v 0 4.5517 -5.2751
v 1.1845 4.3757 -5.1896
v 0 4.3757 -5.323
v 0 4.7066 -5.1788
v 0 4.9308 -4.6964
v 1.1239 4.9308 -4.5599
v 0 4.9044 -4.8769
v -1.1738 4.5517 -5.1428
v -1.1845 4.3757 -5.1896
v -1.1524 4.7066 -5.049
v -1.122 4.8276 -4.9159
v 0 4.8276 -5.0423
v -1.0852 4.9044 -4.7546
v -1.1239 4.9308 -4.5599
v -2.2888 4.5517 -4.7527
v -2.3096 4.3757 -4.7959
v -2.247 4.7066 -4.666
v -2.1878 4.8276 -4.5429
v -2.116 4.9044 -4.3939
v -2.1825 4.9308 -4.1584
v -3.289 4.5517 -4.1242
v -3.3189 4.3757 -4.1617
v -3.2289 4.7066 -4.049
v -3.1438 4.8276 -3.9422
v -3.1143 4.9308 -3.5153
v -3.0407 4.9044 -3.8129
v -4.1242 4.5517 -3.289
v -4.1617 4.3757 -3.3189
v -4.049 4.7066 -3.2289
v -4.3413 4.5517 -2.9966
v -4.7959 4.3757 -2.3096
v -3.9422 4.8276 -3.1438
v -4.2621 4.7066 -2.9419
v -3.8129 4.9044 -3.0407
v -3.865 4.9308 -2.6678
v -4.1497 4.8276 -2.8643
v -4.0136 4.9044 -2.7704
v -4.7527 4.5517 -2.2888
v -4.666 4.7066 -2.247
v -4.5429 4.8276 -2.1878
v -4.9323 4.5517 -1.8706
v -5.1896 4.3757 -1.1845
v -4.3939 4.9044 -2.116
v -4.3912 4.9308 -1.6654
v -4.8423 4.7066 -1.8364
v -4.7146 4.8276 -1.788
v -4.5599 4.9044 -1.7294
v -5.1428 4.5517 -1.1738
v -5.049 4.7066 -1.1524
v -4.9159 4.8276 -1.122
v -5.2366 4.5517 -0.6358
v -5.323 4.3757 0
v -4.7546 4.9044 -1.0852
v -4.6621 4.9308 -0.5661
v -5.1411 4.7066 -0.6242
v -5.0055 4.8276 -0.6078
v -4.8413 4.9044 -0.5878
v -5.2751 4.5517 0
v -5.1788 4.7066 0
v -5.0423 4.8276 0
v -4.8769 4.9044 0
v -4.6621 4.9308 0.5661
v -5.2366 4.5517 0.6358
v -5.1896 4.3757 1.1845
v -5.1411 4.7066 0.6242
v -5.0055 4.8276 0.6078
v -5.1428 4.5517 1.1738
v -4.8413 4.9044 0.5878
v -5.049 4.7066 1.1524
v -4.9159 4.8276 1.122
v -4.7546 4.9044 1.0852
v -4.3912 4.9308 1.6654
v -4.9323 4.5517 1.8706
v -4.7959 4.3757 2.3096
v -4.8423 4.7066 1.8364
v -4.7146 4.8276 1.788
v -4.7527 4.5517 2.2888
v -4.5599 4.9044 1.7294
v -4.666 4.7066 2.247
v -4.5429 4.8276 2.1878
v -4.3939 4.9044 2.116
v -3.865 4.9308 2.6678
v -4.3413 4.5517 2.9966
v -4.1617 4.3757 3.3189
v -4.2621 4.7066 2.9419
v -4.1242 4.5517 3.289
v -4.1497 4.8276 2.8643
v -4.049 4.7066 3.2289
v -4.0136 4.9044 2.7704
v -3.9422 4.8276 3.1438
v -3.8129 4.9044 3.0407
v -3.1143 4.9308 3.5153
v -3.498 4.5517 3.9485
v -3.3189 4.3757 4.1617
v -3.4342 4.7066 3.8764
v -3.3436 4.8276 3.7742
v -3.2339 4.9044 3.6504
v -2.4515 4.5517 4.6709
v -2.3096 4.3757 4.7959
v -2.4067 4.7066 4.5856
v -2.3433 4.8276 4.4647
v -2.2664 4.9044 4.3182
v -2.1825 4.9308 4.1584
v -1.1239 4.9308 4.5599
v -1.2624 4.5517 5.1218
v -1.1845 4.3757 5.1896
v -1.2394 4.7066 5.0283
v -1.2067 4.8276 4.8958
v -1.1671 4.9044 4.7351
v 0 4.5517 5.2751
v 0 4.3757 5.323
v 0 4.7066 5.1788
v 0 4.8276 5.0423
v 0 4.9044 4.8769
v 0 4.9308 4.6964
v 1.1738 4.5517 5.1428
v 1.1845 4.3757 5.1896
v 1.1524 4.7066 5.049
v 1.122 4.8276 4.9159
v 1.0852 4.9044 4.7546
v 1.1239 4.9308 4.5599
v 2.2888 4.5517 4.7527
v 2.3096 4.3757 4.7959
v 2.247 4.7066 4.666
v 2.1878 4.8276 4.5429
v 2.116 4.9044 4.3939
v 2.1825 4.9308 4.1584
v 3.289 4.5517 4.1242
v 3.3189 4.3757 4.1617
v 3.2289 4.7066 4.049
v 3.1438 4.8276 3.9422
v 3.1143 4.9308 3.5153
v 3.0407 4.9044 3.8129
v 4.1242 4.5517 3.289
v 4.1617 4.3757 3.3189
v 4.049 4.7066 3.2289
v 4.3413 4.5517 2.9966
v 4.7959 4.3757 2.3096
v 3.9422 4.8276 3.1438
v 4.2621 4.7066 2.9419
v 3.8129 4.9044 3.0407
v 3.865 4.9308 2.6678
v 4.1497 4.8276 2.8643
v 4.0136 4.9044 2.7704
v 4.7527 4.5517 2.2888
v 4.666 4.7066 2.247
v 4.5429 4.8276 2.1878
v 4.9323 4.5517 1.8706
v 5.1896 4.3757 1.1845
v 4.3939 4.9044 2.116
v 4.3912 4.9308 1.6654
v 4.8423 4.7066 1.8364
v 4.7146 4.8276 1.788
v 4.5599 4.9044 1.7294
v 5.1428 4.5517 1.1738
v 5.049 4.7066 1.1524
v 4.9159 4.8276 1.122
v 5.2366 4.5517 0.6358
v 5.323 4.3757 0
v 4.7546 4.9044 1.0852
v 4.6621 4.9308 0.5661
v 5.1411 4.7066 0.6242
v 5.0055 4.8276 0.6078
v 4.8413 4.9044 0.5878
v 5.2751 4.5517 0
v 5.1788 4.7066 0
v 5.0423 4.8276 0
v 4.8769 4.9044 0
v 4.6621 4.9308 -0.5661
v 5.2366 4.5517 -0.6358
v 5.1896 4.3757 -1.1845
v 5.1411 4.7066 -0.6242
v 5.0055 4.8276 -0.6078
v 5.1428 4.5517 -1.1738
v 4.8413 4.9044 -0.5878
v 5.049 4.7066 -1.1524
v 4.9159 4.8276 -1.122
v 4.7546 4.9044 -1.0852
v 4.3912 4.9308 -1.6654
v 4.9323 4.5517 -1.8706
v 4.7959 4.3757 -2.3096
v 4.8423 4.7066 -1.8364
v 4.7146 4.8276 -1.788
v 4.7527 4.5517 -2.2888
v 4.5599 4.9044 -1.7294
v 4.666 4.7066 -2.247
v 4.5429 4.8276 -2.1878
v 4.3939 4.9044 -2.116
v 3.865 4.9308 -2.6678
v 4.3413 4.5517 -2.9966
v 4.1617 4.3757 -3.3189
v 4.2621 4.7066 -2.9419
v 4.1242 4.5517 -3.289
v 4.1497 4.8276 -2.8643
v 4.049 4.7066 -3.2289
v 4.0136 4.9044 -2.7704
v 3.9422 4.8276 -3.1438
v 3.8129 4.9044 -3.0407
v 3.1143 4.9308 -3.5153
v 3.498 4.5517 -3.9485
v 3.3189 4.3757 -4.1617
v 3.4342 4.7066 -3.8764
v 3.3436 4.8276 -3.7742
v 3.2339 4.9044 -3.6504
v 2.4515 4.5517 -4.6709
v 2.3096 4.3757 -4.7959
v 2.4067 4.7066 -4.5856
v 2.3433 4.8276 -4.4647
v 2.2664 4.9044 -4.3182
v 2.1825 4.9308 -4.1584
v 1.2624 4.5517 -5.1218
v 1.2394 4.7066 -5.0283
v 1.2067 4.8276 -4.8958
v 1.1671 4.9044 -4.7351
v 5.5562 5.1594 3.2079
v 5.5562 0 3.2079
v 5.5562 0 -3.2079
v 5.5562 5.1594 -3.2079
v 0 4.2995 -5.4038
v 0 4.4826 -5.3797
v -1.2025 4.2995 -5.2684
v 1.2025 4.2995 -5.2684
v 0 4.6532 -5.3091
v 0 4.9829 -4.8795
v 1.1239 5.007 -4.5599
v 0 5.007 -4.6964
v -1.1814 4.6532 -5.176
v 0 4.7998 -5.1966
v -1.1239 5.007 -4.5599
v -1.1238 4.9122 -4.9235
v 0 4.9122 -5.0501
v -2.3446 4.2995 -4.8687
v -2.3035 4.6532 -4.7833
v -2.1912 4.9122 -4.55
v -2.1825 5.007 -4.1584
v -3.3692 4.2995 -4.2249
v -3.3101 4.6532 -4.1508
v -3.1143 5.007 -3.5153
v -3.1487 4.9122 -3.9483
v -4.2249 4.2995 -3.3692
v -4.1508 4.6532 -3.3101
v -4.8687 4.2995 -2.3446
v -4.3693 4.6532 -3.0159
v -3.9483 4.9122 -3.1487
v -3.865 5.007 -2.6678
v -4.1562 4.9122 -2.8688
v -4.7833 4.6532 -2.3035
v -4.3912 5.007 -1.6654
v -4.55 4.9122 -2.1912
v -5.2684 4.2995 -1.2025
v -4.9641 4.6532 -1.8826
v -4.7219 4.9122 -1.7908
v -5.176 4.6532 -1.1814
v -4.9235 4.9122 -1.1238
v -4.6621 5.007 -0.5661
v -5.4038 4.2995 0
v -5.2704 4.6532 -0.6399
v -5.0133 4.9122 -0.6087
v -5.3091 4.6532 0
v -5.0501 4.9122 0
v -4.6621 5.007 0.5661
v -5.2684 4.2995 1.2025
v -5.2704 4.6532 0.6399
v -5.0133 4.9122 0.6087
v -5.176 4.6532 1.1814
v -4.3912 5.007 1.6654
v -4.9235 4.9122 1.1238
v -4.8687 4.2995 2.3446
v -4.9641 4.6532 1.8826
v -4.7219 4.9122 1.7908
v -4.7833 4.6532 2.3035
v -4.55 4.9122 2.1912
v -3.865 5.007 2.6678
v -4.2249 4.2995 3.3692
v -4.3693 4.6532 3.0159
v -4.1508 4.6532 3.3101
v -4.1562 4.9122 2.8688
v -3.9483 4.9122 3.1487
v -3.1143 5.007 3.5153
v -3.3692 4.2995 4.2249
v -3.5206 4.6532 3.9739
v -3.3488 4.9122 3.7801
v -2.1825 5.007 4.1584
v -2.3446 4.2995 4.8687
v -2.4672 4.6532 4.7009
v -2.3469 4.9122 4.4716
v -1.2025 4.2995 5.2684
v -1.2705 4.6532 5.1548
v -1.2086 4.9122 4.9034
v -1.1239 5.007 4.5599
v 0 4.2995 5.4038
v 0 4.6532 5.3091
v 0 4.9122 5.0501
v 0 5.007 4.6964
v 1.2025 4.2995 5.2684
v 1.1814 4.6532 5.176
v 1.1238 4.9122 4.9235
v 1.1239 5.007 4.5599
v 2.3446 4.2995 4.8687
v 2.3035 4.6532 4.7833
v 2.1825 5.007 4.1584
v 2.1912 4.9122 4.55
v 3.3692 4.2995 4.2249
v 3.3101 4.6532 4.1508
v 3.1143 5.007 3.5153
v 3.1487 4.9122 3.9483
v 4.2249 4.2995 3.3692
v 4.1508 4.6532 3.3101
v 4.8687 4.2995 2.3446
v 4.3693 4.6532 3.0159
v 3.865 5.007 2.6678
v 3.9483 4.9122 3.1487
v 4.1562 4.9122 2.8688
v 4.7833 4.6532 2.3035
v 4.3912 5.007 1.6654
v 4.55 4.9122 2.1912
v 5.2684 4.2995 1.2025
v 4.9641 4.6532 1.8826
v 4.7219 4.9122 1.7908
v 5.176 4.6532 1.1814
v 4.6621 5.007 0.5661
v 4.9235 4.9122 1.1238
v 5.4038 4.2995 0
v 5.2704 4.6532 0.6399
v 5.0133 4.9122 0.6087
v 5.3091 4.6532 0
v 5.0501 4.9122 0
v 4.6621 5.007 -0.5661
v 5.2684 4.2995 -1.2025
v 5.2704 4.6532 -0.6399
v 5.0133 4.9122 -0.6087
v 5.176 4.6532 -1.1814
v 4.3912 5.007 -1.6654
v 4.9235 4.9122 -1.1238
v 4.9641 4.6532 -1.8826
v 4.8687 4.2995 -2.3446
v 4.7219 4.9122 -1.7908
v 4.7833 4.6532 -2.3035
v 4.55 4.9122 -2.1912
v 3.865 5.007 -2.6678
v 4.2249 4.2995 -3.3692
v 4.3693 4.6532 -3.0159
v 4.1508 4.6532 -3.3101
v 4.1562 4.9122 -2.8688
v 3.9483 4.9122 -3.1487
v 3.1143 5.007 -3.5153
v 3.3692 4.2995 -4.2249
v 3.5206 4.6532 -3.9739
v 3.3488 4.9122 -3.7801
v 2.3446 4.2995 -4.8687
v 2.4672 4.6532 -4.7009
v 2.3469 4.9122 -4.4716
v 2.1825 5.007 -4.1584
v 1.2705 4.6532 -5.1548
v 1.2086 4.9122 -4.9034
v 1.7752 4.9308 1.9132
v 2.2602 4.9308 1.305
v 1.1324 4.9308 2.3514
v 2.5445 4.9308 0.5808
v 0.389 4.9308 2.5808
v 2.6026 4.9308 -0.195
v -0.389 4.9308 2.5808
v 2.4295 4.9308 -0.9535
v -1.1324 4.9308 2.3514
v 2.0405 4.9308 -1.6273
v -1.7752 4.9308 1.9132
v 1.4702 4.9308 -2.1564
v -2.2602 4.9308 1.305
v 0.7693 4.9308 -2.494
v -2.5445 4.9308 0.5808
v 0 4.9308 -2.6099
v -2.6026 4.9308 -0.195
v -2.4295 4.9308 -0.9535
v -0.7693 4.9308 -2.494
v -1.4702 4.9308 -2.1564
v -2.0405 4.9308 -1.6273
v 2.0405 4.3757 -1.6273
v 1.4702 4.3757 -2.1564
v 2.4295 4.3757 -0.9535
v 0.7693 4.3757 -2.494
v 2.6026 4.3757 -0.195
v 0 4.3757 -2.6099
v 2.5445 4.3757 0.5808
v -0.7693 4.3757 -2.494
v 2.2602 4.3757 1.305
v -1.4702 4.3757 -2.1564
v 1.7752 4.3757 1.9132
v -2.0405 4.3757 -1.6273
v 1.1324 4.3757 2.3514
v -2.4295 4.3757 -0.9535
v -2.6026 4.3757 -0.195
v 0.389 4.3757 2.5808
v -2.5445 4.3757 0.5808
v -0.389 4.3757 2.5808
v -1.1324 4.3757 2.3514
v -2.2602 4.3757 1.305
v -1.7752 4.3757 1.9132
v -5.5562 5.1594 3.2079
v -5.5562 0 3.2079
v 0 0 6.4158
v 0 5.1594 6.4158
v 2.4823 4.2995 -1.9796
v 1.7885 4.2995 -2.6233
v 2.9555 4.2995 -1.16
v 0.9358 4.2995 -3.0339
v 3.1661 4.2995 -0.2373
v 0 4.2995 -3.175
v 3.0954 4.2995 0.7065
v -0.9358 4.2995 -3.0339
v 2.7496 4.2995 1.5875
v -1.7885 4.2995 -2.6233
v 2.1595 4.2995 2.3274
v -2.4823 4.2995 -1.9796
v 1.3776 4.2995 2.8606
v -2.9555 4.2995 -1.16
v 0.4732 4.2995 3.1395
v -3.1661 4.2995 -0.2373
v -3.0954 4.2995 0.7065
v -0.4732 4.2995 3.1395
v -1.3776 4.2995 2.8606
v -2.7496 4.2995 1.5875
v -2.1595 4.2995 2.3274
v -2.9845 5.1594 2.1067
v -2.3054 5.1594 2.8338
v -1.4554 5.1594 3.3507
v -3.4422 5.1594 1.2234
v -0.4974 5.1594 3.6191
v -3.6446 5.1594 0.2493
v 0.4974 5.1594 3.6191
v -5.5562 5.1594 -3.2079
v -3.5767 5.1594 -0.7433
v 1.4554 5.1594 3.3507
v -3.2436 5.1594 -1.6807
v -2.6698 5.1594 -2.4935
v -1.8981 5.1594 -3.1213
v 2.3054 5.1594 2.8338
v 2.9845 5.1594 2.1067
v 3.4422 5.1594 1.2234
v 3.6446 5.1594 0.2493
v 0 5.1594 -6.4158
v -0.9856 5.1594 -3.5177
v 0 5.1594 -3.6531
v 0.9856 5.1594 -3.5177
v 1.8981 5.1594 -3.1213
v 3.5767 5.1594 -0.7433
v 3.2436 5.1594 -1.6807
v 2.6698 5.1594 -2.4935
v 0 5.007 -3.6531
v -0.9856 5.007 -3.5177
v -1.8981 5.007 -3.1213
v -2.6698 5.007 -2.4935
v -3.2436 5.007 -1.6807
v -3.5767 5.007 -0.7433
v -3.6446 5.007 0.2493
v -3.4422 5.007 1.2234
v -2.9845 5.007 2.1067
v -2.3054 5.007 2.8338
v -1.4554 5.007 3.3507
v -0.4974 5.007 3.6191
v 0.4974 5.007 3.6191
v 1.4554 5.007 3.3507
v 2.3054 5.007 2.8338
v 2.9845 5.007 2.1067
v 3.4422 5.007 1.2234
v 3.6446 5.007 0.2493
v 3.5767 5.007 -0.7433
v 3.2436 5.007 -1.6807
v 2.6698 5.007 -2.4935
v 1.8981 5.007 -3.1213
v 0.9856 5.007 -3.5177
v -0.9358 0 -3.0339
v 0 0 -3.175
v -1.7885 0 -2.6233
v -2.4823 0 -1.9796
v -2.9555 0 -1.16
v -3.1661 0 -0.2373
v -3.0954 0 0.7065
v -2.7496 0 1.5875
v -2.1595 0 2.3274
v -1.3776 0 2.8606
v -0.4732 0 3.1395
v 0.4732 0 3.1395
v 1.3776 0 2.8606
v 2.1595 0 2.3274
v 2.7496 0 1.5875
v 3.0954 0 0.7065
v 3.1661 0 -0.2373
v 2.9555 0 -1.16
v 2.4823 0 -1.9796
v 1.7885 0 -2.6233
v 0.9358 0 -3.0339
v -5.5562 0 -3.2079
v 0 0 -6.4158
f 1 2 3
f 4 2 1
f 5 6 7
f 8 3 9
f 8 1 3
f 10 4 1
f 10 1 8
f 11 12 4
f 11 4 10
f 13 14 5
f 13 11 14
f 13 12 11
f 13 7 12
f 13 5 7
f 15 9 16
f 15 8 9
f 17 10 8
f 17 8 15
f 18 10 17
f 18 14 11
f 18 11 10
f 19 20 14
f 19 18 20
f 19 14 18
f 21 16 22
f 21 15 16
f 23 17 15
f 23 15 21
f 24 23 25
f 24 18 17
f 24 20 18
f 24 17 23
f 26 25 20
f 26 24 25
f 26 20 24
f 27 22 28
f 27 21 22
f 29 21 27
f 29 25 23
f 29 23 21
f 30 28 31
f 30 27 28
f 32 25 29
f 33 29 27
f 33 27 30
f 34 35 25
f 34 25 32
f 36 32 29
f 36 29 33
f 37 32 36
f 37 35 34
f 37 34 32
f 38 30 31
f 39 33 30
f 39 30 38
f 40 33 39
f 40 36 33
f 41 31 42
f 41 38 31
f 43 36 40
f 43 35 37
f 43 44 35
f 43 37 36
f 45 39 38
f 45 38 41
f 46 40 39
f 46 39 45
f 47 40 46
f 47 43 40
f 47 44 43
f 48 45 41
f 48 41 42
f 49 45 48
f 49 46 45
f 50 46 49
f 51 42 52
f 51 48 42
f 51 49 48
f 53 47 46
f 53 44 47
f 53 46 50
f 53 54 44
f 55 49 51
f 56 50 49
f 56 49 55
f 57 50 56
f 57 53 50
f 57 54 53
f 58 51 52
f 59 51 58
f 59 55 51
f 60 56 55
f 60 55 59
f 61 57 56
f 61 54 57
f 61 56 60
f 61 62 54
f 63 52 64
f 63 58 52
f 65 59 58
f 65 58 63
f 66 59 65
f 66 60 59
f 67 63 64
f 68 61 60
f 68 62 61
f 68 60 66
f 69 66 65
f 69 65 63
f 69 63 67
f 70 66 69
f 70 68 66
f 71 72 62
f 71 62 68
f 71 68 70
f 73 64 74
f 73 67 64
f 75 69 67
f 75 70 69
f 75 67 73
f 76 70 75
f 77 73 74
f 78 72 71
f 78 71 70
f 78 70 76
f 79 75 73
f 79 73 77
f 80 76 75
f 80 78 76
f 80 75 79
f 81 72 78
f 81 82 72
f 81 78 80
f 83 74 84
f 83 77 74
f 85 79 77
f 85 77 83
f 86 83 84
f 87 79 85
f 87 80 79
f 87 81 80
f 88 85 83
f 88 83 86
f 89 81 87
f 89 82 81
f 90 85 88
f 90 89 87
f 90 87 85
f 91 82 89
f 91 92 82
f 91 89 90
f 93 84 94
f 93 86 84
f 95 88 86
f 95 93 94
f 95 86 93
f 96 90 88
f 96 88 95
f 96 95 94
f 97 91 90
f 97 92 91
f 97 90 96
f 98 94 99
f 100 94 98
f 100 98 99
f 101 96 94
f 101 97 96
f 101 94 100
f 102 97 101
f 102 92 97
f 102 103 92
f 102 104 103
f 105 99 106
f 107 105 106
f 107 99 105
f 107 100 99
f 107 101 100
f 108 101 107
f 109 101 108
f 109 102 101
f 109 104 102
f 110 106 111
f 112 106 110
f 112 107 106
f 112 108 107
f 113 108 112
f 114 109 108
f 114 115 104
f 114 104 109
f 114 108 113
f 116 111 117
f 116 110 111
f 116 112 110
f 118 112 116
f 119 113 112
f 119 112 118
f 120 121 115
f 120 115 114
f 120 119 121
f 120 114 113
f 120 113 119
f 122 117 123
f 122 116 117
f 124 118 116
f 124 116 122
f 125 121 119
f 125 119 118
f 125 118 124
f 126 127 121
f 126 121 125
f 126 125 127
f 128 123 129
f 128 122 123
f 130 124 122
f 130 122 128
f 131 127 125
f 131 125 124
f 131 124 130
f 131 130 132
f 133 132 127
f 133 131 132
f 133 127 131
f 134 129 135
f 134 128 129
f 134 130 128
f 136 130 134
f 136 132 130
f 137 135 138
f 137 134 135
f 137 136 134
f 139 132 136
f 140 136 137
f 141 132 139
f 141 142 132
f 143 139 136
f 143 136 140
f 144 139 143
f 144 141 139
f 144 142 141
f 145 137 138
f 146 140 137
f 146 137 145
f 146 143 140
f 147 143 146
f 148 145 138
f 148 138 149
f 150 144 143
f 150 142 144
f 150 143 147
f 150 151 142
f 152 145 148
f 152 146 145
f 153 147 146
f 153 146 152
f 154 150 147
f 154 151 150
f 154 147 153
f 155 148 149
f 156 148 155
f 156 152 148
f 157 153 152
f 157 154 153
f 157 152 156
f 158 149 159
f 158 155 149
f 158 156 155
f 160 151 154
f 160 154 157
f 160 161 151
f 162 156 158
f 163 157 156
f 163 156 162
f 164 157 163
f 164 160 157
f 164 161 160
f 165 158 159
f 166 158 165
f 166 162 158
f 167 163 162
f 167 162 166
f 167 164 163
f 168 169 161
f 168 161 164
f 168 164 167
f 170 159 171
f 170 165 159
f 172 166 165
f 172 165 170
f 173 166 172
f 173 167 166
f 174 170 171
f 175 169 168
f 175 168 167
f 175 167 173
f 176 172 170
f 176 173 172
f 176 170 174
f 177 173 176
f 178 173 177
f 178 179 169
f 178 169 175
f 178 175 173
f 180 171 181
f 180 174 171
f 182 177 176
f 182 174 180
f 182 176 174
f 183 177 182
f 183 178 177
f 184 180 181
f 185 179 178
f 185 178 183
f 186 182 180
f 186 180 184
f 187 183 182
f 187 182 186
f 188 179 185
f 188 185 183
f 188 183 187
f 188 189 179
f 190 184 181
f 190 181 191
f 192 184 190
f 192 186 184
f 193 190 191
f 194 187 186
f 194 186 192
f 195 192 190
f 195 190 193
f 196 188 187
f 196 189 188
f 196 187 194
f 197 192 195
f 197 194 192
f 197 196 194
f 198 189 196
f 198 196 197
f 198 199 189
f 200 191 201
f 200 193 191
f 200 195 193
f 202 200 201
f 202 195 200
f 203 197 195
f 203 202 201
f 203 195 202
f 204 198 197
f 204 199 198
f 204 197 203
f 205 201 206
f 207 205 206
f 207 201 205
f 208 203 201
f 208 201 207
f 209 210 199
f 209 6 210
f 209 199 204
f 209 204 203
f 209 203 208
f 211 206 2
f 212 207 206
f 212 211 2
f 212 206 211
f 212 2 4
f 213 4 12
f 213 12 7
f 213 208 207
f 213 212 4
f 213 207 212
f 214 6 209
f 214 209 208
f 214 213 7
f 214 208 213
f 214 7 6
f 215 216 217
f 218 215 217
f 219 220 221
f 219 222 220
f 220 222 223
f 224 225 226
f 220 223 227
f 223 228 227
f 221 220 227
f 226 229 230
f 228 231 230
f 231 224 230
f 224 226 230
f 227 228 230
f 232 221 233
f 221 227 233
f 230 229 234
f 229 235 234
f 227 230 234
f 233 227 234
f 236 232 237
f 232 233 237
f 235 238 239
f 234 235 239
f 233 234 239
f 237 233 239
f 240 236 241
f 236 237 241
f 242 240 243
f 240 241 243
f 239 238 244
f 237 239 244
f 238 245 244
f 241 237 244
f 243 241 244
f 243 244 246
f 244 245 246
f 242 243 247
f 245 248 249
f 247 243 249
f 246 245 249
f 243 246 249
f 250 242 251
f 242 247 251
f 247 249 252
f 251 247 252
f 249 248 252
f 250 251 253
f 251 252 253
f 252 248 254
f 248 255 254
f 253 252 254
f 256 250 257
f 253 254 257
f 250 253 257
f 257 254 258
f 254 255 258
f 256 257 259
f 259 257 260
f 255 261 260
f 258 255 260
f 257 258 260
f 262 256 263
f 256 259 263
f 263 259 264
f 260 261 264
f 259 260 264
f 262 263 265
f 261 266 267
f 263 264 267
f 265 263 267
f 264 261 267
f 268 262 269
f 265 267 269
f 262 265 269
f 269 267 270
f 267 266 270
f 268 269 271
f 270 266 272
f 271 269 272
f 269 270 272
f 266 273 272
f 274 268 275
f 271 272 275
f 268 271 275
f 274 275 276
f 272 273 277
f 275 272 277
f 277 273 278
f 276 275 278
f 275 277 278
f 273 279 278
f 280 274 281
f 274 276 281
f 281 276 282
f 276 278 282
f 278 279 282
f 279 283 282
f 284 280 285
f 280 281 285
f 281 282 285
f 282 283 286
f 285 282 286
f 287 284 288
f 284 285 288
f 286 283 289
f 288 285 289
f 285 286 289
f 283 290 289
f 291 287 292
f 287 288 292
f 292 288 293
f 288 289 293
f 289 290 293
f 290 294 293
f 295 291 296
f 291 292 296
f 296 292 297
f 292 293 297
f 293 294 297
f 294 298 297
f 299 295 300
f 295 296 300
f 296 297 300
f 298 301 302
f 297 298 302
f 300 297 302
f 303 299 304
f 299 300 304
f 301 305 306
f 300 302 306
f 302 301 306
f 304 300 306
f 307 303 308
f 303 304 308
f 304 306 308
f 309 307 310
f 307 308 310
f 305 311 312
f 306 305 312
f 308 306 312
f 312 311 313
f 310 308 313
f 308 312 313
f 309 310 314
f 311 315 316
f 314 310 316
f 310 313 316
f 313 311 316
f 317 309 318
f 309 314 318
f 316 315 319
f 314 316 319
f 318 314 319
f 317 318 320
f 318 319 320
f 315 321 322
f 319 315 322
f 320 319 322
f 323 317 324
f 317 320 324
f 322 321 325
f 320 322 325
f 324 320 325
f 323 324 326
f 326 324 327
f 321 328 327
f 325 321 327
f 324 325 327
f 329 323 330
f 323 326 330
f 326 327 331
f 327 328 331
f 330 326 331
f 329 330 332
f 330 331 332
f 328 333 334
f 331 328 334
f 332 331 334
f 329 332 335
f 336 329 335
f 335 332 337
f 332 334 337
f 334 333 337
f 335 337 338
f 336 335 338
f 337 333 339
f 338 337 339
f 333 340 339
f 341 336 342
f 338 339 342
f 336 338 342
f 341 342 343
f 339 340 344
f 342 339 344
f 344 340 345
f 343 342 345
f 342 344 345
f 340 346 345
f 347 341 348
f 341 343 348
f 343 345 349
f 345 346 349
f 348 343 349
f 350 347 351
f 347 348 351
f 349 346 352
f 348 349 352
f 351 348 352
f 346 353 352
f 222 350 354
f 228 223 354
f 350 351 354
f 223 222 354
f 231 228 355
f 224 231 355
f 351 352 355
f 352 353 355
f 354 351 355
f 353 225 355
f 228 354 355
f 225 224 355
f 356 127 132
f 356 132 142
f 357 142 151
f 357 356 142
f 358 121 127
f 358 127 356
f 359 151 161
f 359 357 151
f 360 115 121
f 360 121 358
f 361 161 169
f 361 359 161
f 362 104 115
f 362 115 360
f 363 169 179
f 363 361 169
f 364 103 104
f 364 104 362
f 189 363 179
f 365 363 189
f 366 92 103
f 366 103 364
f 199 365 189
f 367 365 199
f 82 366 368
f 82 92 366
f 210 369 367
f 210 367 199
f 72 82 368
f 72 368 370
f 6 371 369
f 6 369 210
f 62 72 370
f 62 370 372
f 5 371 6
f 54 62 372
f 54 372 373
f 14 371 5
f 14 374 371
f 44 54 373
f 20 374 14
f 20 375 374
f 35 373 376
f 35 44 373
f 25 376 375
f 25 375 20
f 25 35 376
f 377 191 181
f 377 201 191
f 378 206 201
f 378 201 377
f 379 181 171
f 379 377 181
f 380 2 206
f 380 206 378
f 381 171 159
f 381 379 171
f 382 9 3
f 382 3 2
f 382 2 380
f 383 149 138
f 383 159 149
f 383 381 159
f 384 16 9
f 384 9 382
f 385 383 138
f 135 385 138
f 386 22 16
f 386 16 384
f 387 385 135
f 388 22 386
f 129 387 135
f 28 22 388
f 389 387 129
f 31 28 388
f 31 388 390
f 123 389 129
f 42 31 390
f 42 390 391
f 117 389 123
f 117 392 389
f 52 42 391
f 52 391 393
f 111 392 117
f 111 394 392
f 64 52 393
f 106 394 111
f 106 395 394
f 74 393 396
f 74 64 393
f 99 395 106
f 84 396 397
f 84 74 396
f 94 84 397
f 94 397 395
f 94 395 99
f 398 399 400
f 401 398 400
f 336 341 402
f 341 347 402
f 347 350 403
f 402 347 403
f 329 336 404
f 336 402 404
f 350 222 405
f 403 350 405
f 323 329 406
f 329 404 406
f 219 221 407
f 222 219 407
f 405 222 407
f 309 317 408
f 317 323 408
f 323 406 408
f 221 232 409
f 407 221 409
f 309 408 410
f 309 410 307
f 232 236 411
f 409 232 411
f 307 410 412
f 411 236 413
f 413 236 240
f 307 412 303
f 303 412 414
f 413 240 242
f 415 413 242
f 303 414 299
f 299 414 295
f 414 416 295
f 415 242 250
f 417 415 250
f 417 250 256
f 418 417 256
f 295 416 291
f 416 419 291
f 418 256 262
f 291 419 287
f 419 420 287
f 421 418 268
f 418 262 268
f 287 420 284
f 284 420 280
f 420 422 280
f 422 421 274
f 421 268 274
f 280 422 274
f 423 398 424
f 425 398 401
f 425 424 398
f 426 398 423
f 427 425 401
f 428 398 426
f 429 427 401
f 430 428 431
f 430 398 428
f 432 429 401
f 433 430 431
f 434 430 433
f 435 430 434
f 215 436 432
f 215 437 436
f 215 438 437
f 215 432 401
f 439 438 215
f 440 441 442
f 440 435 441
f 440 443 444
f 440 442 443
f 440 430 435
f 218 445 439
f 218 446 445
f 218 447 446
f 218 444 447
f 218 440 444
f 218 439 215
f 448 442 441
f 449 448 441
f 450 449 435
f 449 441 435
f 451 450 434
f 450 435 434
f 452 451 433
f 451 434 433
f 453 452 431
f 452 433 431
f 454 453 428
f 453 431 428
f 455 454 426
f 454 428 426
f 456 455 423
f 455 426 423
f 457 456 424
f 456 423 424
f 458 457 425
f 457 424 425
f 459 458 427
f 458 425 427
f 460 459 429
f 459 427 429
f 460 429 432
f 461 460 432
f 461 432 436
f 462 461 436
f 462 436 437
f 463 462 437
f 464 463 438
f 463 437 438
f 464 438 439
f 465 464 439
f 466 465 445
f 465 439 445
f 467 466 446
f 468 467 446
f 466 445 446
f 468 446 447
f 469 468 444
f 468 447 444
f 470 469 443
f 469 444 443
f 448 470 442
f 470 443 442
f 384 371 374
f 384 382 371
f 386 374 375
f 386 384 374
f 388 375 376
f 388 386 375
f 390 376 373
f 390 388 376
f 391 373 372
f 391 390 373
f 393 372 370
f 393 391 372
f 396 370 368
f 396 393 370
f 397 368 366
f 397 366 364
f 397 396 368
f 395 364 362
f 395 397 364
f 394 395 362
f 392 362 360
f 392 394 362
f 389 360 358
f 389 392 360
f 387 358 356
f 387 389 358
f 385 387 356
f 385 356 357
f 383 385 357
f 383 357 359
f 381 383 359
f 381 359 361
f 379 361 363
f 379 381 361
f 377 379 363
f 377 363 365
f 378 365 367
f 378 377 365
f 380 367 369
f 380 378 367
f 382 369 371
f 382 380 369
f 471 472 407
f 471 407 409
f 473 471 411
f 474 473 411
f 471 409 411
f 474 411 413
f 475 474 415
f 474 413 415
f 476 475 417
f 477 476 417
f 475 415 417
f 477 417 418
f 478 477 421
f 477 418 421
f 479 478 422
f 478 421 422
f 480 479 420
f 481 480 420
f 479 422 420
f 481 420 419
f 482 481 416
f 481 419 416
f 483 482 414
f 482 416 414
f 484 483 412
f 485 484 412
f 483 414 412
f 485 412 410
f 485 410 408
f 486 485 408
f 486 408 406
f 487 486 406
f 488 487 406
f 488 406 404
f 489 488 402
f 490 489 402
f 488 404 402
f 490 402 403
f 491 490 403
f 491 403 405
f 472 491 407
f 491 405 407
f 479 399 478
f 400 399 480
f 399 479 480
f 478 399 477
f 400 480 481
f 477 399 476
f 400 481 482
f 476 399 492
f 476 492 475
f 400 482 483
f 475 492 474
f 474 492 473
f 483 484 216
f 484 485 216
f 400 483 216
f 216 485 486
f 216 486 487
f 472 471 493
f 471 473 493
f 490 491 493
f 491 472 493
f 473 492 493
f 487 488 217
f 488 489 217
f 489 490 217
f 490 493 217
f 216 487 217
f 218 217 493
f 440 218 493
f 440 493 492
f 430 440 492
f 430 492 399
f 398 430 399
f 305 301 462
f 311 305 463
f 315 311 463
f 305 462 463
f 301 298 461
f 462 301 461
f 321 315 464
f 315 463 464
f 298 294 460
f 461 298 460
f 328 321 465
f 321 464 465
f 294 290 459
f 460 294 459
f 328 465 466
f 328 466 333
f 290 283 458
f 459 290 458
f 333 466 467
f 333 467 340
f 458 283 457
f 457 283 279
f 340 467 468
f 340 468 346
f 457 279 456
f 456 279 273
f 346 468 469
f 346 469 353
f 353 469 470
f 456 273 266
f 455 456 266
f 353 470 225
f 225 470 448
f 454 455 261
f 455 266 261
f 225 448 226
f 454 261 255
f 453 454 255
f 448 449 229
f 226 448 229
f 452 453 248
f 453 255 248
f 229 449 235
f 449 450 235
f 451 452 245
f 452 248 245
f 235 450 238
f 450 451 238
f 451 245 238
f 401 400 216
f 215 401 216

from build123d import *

# Parameters (mm, degrees)
EXTRUDE1_DEPTH = 5.159375
SKETCH2_W      = 3.175
SKETCH2_H      = 5.159375


with BuildPart() as part:
    # Sketch1 → Extrude1 (new body)
    with BuildSketch(Plane(origin=(0, 0, 0), x_dir=(1, 0, 0), z_dir=(0, 1, 0))):
        Polygon((0, 6.415804866), (-5.55625, 3.207902433), (-5.55625, -3.207902433), (0, -6.415804866), (5.55625, -3.207902433), (5.55625, 3.207902433), align=None)
    extrude(amount=EXTRUDE1_DEPTH)

    # Sketch4 → Cut-Revolve2 (revolve, cut)
    with BuildSketch(Plane(origin=(0, 0, 0), x_dir=(0, 0, -1), z_dir=(1, 0, 0))):
        Polygon((0, 5.159375), (3.175, 5.159375), (2.609908356, 4.895868439), (2.609908356, 0.263506561), (3.175, 0), (0, 0), align=None)
    revolve(axis=Axis((0, 5.159375, 0), (0, 1, 0)), mode=Mode.SUBTRACT)


with BuildPart() as body_2:
    # Sketch2 → Revolve1 (revolve)
    with BuildSketch(Plane(origin=(0, 0, 0), x_dir=(0, 0, -1), z_dir=(1, 0, 0))):
        with Locations((1.5875, 2.5796875)):
            Rectangle(SKETCH2_W, SKETCH2_H)
    revolve(axis=Axis((0, -3.175, 0), (0, 1, 0)))


with BuildPart() as part_1:
    add(part.part)

    # Combine1: cut body 2
    add(body_2.part, mode=Mode.SUBTRACT)

    # Sketch6 → Cut-Revolve4 (revolve, cut)
    with BuildSketch(Plane(origin=(0, 0, 0), x_dir=(0, 0, -1), z_dir=(1, 0, 0))):
        with BuildLine():
            Line((0, 4.299479167), (5.40385, 4.299479167))
            ThreePointArc((5.40385, 4.299479167), (5.196629268, 4.799754268), (4.696354167, 5.006975))
            Line((4.696354167, 5.006975), (3.653131261, 5.006975))
            Line((3.653131261, 5.006975), (3.653131261, 6.429375))
            Line((3.653131261, 6.429375), (0, 6.429375))
            Line((0, 6.429375), (0, 4.299479167))
        make_face()
    revolve(axis=Axis((0, 6.429375, 0), (0, 1, 0)), mode=Mode.SUBTRACT)


with BuildPart() as body_2_2:
    # Sketch7 → Revolve2 (revolve)
    with BuildSketch(Plane(origin=(0, 0, 0), x_dir=(0, 0, -1), z_dir=(1, 0, 0))):
        with BuildLine():
            Line((2.609908356, 4.375679167), (5.3230343, 4.375679167))
            ThreePointArc((5.3230343, 4.375679167), (5.114940888, 4.772046184), (4.696354167, 4.930775))
            Line((4.696354167, 4.930775), (2.609908356, 4.930775))
            Line((2.609908356, 4.930775), (2.609908356, 4.375679167))
        make_face()
    revolve(axis=Axis((0, 4.375679167, 0), (0, 1, 0)))


solid = Compound([part_1.part, body_2_2.part])
